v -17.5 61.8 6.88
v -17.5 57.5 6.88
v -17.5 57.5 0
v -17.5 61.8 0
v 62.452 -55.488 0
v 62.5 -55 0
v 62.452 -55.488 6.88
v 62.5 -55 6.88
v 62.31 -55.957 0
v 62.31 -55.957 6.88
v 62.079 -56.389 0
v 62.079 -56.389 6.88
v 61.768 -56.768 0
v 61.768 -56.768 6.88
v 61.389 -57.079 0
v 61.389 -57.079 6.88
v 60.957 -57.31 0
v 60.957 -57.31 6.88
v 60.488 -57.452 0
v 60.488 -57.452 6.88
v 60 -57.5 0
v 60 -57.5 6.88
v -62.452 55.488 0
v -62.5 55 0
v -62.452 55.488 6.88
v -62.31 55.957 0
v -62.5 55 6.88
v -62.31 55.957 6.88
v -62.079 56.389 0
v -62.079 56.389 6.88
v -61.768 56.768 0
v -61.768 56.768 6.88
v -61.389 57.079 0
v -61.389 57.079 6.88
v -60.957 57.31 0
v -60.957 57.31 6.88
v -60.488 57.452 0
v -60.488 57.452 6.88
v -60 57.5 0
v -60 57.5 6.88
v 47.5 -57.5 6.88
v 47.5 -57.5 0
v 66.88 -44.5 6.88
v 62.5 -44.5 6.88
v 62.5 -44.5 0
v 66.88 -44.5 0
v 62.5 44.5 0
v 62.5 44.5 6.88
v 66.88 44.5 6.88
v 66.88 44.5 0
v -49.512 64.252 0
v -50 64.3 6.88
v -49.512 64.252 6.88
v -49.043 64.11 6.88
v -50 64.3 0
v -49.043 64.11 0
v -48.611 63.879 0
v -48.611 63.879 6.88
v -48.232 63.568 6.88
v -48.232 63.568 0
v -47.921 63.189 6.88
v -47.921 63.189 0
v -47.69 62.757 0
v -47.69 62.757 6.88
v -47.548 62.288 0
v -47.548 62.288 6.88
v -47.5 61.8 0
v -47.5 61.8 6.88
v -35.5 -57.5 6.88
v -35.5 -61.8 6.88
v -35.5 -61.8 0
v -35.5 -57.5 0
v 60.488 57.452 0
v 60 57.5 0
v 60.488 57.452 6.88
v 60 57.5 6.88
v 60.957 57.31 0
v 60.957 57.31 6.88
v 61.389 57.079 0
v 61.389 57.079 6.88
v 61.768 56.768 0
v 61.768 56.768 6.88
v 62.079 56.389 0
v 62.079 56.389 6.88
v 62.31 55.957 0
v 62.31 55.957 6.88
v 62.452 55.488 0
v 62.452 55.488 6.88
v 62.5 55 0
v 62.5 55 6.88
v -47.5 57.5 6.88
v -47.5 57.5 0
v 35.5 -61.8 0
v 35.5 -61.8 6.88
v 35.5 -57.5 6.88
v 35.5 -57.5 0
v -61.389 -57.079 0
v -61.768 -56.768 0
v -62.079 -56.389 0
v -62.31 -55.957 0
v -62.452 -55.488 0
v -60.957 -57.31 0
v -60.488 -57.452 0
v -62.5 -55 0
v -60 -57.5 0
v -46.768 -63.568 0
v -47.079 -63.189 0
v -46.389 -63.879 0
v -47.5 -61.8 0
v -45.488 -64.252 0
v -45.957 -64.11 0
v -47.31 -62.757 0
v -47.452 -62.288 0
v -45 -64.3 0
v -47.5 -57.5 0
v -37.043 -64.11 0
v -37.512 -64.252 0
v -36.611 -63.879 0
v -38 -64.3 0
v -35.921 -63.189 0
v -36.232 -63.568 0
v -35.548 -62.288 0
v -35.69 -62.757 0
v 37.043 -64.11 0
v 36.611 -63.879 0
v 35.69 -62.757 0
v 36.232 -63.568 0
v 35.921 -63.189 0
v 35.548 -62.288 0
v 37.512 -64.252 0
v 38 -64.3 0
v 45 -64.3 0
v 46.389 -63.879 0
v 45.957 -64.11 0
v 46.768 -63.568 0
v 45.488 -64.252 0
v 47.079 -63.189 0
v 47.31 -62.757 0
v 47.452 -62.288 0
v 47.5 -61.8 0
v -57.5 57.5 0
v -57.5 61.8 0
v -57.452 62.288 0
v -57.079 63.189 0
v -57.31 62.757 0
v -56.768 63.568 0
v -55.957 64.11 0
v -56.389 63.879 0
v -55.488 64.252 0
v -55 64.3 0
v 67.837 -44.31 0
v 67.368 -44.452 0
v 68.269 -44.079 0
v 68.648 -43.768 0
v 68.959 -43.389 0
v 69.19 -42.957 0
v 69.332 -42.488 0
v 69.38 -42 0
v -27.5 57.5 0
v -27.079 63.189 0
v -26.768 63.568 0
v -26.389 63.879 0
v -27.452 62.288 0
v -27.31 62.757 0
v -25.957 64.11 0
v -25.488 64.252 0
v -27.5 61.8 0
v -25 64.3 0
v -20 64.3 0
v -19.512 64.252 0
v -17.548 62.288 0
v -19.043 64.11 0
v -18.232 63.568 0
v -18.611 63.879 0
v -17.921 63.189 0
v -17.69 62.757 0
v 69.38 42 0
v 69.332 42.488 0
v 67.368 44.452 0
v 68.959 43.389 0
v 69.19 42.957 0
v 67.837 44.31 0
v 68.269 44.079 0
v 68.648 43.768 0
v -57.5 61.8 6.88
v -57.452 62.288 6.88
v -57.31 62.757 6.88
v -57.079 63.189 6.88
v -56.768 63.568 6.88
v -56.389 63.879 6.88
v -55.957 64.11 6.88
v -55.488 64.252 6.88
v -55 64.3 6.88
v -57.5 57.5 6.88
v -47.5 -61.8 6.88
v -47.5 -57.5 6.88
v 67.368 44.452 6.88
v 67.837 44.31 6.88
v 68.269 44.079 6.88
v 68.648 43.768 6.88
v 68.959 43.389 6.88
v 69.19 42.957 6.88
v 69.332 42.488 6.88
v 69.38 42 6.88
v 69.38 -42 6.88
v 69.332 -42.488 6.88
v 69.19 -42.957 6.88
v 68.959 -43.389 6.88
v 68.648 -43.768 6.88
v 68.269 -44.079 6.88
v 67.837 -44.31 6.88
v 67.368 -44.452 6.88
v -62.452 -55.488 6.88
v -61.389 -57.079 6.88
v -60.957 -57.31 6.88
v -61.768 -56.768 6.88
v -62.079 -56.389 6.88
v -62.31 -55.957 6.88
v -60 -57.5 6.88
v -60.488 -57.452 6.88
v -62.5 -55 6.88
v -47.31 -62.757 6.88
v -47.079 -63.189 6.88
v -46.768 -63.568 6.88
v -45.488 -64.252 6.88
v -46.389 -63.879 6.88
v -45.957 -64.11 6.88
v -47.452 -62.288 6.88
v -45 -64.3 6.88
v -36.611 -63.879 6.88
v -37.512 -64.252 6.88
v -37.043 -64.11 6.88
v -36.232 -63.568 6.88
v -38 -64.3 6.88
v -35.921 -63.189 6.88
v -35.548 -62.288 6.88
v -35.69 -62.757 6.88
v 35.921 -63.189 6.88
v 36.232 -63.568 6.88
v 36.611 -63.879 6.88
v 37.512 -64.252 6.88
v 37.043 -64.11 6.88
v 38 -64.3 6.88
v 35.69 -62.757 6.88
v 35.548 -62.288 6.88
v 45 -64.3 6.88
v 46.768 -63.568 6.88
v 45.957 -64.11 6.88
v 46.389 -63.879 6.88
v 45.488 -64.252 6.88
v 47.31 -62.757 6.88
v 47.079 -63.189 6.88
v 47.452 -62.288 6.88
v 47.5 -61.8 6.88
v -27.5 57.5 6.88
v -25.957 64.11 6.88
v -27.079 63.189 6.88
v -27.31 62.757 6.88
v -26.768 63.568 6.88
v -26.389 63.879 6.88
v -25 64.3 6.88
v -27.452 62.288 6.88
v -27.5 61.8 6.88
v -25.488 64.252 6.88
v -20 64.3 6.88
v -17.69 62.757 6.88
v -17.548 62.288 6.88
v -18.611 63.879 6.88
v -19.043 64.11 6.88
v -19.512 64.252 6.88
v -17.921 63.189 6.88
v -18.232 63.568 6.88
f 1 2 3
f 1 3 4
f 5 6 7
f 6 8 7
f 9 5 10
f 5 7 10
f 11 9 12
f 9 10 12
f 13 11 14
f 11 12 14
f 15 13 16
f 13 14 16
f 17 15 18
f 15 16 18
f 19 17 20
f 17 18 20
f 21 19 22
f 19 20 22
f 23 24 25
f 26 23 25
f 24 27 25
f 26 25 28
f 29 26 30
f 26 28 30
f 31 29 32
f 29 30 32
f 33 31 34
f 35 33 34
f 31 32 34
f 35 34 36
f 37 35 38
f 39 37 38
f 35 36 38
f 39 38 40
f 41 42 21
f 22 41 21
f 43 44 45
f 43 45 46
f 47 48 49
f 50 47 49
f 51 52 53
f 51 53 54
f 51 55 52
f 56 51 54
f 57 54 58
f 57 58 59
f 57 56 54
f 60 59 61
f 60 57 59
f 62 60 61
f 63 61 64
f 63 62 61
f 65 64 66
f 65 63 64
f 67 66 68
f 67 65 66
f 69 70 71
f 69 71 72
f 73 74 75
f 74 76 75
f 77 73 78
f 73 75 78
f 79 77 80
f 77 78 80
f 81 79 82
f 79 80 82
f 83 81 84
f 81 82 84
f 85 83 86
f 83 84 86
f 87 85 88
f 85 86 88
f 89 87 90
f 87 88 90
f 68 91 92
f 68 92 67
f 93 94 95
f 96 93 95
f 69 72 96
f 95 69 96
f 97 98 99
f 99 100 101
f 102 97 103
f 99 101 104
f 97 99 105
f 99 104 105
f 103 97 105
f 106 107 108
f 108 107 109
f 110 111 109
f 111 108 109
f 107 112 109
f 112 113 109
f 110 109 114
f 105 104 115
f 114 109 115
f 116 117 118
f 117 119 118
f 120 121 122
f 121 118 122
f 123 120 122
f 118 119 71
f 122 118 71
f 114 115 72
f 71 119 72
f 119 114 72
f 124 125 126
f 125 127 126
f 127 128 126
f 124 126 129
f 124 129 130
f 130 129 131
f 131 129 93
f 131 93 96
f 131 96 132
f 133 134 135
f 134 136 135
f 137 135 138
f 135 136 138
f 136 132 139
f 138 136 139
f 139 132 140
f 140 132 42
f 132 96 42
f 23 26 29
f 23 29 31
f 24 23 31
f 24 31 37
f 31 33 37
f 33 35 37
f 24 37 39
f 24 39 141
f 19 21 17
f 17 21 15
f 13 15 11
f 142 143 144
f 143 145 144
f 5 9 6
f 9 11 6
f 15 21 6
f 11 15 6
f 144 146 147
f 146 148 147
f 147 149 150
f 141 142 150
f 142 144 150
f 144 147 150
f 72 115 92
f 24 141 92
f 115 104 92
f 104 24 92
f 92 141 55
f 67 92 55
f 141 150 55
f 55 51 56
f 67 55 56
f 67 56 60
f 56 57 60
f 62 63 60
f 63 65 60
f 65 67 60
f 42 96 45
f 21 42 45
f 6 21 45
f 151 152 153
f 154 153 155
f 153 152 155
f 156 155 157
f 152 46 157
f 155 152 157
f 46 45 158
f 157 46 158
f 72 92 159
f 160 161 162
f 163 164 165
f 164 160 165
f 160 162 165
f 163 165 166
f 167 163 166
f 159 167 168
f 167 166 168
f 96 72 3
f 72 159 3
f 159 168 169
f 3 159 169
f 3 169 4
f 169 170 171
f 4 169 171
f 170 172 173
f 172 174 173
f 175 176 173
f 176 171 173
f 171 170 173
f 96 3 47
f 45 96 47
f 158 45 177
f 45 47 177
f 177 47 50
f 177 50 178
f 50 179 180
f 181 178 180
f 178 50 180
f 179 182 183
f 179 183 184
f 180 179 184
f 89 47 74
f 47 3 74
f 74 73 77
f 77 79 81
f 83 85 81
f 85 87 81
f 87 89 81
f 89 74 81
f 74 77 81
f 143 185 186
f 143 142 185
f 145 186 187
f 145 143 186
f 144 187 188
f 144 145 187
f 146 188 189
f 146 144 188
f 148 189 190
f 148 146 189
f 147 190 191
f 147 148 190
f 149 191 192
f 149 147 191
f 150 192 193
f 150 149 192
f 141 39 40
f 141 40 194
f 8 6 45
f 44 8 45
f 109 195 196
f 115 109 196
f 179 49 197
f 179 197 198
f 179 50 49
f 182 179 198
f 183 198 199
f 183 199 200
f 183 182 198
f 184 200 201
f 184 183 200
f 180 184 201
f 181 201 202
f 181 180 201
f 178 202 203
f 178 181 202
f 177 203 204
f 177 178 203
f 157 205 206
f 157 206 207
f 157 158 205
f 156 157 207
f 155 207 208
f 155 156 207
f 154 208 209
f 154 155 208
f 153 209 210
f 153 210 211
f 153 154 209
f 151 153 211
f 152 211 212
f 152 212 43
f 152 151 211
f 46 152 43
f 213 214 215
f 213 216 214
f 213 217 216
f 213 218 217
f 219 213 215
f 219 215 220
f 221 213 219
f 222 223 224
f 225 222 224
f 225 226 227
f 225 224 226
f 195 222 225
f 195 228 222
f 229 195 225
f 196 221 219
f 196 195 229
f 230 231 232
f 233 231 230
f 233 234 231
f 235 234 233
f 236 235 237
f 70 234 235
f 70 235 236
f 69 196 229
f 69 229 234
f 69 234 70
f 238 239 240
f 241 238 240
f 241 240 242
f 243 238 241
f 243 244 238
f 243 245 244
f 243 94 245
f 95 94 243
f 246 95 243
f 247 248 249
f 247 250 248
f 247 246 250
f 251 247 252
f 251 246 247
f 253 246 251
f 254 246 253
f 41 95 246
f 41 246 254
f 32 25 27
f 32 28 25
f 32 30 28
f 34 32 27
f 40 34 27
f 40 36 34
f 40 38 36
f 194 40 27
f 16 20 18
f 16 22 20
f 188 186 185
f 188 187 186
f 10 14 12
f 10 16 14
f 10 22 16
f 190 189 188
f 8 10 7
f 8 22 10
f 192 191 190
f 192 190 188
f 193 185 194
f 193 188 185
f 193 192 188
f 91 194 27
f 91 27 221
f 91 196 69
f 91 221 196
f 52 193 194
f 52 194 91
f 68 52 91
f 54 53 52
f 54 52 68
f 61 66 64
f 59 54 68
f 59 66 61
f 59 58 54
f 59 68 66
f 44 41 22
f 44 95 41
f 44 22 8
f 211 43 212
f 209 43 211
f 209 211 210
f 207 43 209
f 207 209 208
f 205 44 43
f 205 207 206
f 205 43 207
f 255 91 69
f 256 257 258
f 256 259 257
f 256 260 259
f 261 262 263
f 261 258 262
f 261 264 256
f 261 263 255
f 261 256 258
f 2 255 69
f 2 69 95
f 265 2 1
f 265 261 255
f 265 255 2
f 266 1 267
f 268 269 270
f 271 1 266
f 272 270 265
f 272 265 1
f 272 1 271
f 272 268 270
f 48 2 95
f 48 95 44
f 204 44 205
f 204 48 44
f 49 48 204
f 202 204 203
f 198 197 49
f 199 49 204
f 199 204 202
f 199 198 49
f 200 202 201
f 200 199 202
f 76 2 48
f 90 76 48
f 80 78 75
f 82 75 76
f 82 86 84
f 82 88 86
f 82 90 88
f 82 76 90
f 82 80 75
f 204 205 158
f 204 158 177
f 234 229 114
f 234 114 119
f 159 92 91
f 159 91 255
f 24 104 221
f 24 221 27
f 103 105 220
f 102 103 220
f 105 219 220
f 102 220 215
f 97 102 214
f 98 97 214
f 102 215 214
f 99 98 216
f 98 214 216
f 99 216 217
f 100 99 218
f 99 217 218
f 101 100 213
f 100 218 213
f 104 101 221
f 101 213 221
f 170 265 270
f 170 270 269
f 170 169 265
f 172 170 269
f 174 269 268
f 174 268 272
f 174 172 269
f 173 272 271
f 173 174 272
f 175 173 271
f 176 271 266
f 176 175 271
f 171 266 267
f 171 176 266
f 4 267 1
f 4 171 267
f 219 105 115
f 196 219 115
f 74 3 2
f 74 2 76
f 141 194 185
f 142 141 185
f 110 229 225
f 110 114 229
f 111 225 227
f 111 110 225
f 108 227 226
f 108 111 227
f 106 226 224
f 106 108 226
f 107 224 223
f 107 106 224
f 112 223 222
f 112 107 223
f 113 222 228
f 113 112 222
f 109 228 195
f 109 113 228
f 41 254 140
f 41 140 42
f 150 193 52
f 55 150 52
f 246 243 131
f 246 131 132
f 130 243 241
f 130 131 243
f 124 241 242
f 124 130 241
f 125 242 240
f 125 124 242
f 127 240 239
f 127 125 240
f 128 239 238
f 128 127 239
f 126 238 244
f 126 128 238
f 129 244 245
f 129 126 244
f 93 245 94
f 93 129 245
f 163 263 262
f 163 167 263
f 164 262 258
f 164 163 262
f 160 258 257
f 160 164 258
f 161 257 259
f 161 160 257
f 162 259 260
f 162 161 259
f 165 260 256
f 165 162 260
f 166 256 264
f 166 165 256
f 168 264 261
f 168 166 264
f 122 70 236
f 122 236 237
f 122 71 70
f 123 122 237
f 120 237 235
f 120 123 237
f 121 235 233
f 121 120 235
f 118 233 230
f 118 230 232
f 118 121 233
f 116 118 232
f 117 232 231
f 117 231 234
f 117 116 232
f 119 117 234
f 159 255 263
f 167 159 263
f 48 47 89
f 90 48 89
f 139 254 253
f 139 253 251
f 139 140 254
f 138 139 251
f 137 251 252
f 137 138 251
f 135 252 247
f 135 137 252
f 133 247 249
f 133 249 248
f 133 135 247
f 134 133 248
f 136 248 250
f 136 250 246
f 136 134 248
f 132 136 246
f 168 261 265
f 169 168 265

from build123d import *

# Parameters (mm, degrees)
SKETCH1_W           = 125
SKETCH1_H           = 115
BOSS_EXTRUDE1_DEPTH = 6.88
SKETCH2_W           = 10
SKETCH2_H           = 13.6
SKETCH2_W_2         = 12
BOSS_EXTRUDE2_DEPTH = 6.88
SKETCH3_W           = 13.76
SKETCH3_H           = 89
BOSS_EXTRUDE3_DEPTH = 6.88
FILLET1_R           = 2.5


with BuildPart() as part:
    # Sketch1 → Boss-Extrude1 (new body)
    with BuildSketch(Plane.XY):
        Rectangle(SKETCH1_W, SKETCH1_H)
    extrude(amount=BOSS_EXTRUDE1_DEPTH)

    # Sketch2 → Boss-Extrude2 (add)
    with BuildSketch(Plane.XY.offset(6.88)):
        with Locations((-52.5, 57.5)):
            Rectangle(SKETCH2_W, SKETCH2_H)
        with Locations((-22.5, 57.5)):
            Rectangle(SKETCH2_W, SKETCH2_H)
        with Locations((-41.5, -57.5)):
            Rectangle(SKETCH2_W_2, SKETCH2_H)
        with Locations((41.5, -57.5)):
            Rectangle(SKETCH2_W_2, SKETCH2_H)
    extrude(amount=-BOSS_EXTRUDE2_DEPTH)

    # Sketch3 → Boss-Extrude3 (add)
    with BuildSketch(Plane.XY.offset(6.88)):
        with Locations((62.5, 0)):
            Rectangle(SKETCH3_W, SKETCH3_H)
    extrude(amount=-BOSS_EXTRUDE3_DEPTH)

    # Fillet1
    fillet1_edges = [part.edges().sort_by_distance(p)[0] for p in [
        (69.38, -44.5, 3.44),
        (69.38, 44.5, 3.44),
        (-47.5, 64.3, 3.44),
        (-57.5, 64.3, 3.44),
        (-17.5, 64.3, 3.44),
        (-27.5, 64.3, 3.44),
        (-47.5, -64.3, 3.44),
        (-35.5, -64.3, 3.44),
        (-62.5, 57.5, 3.44),
        (62.5, 57.5, 3.44),
        (35.5, -64.3, 3.44),
        (62.5, -57.5, 3.44),
        (-62.5, -57.5, 3.44),
        (47.5, -64.3, 3.44),
    ]]
    fillet(fillet1_edges, radius=FILLET1_R)


solid = part.part
